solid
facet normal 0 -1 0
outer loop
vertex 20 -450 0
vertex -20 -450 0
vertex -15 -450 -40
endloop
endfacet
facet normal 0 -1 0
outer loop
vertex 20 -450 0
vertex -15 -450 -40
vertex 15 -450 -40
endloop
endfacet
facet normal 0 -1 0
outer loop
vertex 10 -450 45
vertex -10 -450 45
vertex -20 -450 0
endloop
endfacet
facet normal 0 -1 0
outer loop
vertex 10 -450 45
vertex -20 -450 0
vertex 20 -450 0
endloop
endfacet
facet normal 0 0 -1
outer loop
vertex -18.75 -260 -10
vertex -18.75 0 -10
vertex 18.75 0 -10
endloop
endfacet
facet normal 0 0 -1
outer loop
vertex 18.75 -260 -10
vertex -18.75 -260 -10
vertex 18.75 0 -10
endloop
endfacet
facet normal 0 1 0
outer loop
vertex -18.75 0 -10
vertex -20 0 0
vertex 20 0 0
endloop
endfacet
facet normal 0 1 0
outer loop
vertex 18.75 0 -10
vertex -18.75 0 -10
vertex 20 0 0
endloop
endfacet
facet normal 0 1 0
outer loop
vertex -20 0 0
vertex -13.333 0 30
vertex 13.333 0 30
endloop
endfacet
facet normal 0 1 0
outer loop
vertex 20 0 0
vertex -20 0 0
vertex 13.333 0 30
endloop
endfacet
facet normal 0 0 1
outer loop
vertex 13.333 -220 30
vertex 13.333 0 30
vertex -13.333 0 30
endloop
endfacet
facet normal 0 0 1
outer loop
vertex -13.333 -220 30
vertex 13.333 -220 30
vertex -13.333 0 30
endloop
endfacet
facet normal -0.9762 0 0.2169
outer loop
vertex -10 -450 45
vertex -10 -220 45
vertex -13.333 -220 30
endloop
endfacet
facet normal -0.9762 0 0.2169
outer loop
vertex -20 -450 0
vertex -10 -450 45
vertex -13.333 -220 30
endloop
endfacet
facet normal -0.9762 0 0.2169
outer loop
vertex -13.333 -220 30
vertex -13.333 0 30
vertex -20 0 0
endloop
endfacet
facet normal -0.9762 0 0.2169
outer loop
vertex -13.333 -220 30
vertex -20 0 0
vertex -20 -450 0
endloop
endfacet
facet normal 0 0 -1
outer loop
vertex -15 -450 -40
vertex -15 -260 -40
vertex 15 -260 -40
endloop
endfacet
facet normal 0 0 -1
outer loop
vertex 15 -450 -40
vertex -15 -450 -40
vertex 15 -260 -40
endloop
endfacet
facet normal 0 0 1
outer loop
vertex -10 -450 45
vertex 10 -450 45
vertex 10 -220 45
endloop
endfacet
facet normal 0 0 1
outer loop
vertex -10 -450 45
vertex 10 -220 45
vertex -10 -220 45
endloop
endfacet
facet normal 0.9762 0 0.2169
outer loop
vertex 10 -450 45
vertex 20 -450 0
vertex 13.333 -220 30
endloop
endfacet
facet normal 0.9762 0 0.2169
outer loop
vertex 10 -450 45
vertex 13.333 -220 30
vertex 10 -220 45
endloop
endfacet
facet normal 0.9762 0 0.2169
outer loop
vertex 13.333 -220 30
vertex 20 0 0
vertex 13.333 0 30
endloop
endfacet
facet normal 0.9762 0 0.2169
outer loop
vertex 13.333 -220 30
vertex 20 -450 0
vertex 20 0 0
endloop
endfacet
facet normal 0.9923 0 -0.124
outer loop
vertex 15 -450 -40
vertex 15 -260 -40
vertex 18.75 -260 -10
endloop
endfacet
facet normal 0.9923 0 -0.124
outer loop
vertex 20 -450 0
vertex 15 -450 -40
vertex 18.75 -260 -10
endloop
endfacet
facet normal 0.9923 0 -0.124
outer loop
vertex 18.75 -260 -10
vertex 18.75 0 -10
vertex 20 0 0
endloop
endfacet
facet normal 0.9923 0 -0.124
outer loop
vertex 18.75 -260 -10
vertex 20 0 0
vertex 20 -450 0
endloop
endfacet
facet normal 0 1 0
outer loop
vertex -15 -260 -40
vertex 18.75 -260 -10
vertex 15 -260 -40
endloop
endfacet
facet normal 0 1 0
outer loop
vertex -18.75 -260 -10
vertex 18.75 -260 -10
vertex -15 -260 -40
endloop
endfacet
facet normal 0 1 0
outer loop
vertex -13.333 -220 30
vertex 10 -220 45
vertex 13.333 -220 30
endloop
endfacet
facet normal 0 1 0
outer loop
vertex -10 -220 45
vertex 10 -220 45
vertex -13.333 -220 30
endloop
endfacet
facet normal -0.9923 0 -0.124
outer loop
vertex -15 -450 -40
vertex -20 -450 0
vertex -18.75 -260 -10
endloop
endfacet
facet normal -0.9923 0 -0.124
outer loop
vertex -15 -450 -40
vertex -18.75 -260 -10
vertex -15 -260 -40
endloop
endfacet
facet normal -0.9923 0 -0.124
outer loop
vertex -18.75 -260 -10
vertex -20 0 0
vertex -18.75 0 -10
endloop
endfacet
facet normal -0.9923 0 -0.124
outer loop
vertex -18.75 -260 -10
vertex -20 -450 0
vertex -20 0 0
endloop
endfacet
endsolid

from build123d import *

# Parameters (mm, degrees)
F1_DEPTH = 450
F3_DEPTH = 220
F5_DEPTH = 260


with BuildPart() as f1:
    # F0 (on Front) → F1 (new body)
    with BuildSketch(Plane.XZ):
        Polygon((10, 45), (-10, 45), (-20, 0), (-15, -40), (15, -40), (20, 0), align=None)
    extrude(amount=F1_DEPTH)

    # F2 (on face) → F3 (cut)
    with BuildSketch(Plane(origin=(0, 0, 0), x_dir=(-1, 0, 0), z_dir=(0, 1, 0))):
        Polygon((-10, 45), (-13.3333333333, 30), (13.3333333333, 30), (10, 45), align=None)
    extrude(amount=-F3_DEPTH, mode=Mode.SUBTRACT)

    # F4 (on face) → F5 (cut)
    with BuildSketch(Plane(origin=(0, 0, 0), x_dir=(-1, 0, 0), z_dir=(0, 1, 0))):
        Polygon((18.75, -10), (-18.75, -10), (-15, -40), (15, -40), align=None)
    extrude(amount=-F5_DEPTH, mode=Mode.SUBTRACT)


solid = f1.part
